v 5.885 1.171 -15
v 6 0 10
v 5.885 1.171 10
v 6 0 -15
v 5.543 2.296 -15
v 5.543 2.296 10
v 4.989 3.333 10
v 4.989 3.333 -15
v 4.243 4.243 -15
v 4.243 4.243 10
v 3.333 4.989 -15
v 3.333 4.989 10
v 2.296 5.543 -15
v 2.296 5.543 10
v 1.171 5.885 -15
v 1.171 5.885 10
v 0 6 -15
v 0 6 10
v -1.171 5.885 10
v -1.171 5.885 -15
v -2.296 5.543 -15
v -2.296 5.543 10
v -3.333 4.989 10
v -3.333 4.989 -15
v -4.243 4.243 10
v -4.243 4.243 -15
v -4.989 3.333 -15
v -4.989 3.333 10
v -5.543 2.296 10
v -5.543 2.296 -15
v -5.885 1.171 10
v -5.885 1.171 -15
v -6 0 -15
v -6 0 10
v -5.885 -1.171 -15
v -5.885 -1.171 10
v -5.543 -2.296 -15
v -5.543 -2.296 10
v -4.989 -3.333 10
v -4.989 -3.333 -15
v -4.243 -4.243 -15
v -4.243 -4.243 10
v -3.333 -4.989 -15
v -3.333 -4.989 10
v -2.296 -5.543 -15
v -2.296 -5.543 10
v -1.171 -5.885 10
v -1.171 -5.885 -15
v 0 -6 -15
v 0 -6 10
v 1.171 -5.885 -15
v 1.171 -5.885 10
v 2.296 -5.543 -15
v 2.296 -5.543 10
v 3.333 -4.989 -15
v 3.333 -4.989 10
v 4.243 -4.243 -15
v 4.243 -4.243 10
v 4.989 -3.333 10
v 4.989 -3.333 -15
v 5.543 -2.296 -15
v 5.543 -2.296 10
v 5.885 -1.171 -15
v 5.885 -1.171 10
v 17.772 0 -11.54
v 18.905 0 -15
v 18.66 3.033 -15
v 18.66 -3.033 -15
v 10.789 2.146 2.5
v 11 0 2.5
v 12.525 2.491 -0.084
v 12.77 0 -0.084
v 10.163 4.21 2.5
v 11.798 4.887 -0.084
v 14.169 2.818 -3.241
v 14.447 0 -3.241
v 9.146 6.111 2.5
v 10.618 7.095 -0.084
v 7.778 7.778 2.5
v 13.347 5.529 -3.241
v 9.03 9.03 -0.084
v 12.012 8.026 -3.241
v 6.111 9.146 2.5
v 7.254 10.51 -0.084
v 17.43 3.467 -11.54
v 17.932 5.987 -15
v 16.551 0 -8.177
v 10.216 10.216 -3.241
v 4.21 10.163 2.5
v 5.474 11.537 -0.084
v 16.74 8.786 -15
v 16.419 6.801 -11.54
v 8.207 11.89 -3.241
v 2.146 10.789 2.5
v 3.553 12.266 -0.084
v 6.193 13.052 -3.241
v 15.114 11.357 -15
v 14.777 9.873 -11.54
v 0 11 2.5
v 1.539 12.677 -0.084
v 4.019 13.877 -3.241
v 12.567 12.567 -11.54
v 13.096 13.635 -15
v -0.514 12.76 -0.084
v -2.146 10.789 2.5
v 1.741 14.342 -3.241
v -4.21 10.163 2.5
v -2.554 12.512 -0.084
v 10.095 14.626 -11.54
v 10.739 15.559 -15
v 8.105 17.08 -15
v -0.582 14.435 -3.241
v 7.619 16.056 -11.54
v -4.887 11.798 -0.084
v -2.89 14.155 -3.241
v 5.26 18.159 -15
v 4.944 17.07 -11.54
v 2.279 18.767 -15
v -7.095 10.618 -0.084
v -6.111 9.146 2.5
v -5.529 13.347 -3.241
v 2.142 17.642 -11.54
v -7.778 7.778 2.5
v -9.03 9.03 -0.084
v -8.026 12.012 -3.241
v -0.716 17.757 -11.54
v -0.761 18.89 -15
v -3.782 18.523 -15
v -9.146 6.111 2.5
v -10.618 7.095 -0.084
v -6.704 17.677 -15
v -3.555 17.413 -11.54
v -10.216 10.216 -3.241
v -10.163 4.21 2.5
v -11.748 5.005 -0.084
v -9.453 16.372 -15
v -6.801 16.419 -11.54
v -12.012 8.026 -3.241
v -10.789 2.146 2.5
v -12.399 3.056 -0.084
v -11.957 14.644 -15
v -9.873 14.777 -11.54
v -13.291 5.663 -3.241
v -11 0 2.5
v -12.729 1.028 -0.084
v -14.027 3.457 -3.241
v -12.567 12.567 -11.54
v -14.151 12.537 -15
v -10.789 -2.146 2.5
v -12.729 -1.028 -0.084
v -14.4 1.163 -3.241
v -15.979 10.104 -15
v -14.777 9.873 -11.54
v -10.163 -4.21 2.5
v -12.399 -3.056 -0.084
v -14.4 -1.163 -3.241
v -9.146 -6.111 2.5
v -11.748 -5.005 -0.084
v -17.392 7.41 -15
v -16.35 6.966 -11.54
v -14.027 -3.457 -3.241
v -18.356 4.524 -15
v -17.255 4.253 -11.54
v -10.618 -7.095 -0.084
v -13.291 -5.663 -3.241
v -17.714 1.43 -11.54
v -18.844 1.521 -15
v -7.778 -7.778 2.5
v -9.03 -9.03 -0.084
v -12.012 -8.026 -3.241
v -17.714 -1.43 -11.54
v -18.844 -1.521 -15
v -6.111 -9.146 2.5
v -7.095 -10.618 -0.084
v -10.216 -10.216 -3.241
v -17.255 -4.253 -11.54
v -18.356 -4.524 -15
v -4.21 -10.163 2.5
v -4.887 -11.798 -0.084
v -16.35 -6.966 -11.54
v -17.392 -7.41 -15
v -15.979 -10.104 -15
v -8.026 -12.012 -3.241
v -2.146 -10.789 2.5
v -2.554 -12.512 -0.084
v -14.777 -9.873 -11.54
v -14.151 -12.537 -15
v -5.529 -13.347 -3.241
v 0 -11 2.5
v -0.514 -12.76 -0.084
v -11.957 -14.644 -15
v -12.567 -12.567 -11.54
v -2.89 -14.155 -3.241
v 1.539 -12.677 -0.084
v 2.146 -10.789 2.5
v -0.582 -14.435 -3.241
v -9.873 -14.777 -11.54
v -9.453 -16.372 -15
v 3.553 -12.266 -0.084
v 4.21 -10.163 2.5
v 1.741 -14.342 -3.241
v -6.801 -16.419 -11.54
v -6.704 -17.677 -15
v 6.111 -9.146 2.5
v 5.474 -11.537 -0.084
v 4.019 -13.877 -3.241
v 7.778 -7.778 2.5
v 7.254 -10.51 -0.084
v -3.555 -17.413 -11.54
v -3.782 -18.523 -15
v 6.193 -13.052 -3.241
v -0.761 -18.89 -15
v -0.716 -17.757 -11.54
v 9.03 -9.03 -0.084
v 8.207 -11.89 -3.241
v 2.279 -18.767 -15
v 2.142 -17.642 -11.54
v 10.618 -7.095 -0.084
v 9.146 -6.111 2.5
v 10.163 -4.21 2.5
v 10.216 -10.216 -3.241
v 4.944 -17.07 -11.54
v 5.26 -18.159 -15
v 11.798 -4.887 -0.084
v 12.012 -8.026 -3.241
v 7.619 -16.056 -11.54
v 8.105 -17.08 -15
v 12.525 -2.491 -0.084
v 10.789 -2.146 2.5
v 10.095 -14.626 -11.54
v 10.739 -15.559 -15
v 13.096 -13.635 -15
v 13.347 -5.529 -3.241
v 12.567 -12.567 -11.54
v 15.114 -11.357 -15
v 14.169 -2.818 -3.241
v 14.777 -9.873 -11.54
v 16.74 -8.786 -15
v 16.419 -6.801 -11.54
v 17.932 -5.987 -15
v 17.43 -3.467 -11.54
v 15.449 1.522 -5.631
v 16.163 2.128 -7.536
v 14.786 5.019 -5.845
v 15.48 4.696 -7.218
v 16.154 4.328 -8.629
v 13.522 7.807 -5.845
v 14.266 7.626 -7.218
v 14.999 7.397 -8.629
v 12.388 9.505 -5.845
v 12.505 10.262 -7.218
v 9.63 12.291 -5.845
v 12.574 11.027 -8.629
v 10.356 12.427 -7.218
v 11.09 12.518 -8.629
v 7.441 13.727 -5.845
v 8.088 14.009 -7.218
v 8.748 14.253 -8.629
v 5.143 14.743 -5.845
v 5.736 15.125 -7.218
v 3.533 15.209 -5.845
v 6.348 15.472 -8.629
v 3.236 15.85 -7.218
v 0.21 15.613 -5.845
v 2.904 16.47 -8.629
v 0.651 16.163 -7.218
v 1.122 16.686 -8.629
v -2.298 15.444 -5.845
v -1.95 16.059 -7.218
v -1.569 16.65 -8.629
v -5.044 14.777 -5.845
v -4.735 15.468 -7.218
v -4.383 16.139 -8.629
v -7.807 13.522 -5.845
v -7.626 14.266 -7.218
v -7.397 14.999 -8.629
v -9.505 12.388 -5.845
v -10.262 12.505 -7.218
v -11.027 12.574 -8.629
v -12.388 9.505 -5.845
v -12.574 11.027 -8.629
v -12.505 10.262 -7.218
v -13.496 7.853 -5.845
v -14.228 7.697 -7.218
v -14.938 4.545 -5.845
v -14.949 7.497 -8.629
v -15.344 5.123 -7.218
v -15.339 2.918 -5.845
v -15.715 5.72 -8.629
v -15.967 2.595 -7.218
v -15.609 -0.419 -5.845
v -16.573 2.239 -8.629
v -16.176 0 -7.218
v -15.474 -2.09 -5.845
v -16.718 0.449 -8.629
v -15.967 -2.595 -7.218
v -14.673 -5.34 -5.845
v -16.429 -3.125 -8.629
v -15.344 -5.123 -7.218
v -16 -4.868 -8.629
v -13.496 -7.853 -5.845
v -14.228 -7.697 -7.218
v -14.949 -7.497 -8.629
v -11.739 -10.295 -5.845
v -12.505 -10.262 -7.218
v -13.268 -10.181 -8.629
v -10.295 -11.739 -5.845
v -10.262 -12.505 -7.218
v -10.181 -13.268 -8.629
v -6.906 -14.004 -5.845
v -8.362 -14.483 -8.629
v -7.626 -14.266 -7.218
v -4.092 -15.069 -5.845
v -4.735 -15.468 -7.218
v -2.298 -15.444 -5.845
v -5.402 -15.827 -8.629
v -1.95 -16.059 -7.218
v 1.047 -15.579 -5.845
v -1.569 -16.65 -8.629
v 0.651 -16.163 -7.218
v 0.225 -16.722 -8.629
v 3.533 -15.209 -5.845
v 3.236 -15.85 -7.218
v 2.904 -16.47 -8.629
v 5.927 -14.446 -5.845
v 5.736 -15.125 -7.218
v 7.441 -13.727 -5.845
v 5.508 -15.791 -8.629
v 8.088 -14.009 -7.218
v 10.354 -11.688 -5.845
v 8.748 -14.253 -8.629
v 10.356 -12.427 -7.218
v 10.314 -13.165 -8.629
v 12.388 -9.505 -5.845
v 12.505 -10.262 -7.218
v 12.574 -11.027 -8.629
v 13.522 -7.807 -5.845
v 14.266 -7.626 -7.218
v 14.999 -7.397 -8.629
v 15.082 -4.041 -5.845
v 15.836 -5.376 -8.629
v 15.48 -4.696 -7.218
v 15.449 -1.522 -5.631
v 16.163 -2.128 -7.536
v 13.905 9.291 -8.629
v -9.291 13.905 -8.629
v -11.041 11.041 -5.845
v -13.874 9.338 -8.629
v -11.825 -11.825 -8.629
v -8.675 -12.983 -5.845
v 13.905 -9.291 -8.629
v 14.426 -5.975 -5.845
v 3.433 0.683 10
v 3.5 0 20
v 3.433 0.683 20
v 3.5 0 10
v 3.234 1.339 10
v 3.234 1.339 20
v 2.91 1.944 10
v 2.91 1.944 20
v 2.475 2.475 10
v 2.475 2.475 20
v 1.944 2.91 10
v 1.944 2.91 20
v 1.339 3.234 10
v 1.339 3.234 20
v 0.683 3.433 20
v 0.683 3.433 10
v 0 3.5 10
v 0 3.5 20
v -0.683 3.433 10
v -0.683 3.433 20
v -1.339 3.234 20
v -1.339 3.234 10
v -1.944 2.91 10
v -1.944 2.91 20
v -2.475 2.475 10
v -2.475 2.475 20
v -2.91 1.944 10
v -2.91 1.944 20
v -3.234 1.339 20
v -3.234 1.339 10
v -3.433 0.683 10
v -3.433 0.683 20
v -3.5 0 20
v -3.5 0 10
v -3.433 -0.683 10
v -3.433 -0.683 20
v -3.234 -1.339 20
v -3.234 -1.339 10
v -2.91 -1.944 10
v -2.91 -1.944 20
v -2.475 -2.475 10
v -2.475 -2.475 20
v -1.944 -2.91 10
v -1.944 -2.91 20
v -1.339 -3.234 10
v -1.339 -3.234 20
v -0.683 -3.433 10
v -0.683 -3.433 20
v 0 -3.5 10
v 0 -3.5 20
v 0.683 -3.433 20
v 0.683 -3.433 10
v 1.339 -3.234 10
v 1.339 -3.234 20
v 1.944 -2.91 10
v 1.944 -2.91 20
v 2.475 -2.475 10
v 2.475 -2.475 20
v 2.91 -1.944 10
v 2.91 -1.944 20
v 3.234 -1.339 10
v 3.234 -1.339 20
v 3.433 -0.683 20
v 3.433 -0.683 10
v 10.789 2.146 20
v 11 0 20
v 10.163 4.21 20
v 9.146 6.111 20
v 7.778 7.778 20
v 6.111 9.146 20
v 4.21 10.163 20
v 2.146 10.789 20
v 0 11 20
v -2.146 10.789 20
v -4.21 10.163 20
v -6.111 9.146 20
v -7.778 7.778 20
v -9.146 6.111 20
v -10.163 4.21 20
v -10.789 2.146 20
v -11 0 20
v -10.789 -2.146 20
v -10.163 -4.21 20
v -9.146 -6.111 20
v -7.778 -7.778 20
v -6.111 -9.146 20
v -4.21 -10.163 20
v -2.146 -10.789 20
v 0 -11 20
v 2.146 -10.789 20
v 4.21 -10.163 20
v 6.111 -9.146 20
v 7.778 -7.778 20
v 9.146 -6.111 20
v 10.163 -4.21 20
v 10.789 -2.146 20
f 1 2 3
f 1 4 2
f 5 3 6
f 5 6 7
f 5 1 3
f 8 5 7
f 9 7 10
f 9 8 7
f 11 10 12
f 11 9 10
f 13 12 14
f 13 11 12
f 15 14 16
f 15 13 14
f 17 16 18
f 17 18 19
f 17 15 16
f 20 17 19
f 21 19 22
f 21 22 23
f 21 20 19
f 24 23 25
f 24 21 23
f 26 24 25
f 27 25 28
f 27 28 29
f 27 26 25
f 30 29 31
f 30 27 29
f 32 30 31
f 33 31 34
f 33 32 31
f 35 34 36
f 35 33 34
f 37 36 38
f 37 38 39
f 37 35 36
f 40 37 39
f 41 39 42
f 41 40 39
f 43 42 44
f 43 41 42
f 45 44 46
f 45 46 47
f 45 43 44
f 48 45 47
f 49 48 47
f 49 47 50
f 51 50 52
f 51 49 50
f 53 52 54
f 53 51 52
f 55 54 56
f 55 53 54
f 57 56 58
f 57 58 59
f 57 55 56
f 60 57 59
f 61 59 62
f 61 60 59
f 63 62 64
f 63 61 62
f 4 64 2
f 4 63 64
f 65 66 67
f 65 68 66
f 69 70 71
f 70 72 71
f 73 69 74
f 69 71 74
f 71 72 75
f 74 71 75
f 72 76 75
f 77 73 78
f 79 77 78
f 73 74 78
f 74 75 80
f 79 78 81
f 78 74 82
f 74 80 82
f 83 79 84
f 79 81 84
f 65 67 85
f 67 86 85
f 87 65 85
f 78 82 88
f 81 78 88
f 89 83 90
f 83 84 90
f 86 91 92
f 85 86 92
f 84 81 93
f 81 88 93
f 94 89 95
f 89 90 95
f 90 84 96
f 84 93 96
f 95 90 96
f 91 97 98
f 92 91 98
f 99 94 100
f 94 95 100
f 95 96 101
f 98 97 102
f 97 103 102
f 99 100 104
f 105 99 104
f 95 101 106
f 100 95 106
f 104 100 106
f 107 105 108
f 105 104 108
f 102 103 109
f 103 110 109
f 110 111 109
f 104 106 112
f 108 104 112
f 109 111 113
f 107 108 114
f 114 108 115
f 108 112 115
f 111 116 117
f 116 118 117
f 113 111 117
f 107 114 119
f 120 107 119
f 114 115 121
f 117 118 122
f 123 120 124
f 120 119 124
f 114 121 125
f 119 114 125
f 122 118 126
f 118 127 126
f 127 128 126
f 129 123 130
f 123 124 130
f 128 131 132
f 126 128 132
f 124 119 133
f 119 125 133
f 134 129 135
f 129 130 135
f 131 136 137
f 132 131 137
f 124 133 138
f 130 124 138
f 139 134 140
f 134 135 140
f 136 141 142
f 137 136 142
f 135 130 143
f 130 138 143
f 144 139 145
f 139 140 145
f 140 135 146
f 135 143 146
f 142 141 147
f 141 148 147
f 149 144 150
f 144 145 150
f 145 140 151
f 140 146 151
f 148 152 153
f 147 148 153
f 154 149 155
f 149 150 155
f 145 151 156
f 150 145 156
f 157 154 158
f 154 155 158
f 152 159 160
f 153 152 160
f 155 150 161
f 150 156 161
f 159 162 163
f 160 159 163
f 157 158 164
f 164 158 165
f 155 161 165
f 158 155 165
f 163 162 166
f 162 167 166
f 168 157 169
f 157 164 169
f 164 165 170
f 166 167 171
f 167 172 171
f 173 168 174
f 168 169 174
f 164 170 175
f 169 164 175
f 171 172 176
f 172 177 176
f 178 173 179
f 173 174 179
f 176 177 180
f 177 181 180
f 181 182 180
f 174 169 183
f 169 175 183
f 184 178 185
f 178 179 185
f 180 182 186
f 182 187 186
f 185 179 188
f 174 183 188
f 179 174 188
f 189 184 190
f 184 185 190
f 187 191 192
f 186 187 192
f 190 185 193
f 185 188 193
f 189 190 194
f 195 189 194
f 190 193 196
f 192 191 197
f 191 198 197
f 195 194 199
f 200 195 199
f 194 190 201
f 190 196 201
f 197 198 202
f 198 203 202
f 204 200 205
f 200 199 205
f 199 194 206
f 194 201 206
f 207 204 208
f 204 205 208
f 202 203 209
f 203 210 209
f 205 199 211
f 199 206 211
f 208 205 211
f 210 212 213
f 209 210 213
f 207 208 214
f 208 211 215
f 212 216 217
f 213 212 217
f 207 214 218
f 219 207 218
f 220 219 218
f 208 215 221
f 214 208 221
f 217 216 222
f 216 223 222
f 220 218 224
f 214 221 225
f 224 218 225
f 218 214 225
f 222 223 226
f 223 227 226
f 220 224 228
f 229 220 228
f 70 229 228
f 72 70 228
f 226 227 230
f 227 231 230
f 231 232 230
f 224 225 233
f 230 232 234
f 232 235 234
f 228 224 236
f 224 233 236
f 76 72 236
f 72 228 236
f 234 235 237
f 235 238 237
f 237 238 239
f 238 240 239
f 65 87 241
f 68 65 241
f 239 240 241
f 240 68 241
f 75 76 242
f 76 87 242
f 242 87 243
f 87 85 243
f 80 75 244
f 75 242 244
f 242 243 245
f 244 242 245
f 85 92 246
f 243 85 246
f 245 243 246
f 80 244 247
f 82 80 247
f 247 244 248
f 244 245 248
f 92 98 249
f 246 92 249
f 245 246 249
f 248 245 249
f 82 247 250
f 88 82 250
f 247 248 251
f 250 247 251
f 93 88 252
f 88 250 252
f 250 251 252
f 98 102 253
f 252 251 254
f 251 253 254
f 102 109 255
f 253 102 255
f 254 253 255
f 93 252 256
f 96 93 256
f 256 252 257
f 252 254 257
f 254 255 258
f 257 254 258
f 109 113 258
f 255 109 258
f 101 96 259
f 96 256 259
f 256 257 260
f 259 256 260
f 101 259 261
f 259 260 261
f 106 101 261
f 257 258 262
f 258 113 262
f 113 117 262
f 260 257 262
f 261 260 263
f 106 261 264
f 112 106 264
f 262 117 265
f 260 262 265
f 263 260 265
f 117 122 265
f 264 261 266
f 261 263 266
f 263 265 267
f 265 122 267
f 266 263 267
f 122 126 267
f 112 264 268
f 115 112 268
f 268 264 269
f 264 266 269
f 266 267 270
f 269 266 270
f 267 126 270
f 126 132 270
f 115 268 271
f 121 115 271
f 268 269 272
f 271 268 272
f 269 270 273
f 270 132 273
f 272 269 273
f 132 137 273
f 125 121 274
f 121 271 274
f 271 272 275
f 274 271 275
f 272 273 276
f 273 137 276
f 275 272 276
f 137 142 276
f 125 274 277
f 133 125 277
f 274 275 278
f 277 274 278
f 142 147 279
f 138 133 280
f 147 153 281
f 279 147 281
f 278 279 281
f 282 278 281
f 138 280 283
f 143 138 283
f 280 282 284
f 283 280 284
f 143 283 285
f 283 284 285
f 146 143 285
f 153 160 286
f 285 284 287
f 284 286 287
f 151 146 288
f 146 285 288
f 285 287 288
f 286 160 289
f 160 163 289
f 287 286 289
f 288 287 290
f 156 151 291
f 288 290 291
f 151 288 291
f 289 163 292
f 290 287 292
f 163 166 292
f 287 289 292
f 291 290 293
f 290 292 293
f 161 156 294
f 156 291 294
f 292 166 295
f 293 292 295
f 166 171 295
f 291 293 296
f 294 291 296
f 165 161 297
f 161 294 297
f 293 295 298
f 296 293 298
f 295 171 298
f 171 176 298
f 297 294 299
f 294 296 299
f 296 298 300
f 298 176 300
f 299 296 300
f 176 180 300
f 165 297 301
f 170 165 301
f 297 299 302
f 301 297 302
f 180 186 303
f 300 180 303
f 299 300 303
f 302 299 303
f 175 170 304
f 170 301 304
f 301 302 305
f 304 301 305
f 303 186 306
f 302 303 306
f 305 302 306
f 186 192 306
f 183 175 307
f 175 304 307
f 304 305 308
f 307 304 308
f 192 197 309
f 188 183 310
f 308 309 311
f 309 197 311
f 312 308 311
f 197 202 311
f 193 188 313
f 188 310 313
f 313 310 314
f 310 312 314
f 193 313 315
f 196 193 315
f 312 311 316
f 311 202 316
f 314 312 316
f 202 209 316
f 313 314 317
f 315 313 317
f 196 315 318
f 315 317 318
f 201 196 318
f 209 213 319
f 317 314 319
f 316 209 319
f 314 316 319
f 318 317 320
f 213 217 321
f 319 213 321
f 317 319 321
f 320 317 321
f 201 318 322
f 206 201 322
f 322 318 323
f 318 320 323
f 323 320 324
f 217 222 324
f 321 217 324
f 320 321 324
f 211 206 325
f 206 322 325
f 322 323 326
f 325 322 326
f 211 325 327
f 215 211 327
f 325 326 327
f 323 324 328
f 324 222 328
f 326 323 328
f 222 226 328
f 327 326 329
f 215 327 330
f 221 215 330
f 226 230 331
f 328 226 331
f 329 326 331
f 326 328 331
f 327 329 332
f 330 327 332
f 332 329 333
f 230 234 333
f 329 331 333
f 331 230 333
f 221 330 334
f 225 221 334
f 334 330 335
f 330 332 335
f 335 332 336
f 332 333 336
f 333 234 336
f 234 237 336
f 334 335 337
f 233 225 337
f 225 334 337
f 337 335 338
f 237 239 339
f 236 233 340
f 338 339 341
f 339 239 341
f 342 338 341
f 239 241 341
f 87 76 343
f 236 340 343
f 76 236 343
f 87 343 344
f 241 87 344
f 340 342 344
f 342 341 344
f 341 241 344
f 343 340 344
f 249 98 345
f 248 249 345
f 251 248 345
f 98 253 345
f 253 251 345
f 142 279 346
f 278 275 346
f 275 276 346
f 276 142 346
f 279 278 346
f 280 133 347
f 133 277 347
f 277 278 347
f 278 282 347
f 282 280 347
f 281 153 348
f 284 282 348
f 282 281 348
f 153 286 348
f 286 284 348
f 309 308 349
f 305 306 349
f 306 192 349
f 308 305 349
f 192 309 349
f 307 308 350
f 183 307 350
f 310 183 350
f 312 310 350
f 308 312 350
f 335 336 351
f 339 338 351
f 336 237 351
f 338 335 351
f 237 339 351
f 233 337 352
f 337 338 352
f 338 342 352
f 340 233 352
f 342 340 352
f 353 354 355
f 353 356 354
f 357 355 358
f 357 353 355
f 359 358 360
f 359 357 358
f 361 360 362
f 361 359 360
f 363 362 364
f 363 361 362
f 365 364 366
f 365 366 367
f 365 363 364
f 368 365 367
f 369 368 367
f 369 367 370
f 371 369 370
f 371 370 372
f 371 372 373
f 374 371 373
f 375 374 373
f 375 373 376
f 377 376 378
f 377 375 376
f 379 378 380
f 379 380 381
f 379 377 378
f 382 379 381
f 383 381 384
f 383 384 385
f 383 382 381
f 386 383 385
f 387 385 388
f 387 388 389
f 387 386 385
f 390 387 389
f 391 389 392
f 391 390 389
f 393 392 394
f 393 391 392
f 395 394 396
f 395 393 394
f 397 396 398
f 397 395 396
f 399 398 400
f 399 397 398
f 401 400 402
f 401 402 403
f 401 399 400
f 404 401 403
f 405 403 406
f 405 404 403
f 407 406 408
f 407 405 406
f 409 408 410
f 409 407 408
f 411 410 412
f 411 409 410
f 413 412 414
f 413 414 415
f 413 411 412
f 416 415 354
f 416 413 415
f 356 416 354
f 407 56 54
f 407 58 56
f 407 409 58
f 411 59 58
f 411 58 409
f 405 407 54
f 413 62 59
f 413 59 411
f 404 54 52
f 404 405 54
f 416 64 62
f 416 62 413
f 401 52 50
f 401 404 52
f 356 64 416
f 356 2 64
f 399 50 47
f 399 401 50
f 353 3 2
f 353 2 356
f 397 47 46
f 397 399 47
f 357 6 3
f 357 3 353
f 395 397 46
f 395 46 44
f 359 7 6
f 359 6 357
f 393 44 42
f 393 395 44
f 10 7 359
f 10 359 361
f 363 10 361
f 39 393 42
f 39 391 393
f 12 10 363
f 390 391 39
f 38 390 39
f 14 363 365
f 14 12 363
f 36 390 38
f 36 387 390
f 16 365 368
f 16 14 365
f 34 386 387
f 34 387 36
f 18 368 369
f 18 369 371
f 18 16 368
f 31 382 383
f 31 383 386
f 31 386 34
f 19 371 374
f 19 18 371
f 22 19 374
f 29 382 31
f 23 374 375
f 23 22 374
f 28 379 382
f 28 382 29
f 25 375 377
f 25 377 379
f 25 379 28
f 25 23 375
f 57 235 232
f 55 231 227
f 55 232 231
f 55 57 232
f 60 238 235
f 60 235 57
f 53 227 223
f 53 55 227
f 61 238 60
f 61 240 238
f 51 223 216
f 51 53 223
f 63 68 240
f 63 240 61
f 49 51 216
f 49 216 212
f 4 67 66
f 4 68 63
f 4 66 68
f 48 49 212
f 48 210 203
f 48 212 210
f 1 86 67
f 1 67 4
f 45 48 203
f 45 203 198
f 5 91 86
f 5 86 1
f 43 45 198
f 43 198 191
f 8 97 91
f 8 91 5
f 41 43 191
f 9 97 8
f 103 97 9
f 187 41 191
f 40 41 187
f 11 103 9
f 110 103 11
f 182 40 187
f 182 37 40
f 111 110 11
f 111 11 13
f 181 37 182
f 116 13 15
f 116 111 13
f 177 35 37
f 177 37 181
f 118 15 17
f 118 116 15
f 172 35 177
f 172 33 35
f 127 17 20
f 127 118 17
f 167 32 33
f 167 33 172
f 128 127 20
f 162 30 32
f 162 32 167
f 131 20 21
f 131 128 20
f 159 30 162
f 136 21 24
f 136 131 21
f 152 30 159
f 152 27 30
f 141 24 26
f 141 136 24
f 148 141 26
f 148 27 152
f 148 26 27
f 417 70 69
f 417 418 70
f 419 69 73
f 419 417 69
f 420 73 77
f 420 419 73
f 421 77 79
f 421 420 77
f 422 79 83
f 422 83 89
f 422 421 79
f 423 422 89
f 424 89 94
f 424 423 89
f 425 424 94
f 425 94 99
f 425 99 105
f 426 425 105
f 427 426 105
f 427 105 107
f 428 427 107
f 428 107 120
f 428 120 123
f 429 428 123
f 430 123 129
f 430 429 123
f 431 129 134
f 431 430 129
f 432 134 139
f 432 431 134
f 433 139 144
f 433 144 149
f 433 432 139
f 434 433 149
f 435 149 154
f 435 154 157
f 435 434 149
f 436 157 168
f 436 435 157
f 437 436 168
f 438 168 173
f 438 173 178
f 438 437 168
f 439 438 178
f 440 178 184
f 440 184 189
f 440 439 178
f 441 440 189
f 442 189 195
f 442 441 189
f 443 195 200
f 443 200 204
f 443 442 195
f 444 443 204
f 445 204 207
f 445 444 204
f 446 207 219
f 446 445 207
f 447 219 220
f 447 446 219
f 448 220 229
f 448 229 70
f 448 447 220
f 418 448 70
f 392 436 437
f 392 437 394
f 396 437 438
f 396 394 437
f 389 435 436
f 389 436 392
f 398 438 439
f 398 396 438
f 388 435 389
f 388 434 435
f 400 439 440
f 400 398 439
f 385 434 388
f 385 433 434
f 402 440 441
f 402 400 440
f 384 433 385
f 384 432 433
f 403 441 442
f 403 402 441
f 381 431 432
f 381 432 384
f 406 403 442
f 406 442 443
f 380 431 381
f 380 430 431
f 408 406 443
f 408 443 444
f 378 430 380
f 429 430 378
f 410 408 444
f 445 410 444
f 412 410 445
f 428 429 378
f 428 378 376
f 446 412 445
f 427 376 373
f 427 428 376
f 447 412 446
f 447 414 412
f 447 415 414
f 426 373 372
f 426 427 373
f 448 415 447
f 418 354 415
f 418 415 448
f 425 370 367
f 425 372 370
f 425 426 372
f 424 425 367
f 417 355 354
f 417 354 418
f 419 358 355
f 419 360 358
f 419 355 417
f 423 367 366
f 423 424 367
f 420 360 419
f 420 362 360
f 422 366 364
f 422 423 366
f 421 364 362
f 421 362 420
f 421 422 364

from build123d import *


with BuildPart() as f1:
    # F0 (on Front) → F1 (revolve)
    with BuildSketch(Plane.XZ):
        with BuildLine():
            add(Edge.make_bspline(
                [(11, 2.5), (14.0556900188, -1.2942891031), (16.7506798401, -8.110861107), (18.9052545744, -15)],
                knots=[0, 0, 0, 0, 0.3619010088, 0.3619010088, 0.3619010088, 0.3619010088], degree=3))
            Line((11, 2.5), (11, -15))
            Line((11, -15), (18.9052545744, -15))
        make_face()
        Polygon((11, 20), (3.5, 20), (3.5, 10), (6, 10), (6, -15), (11, -15), (11, 2.5), align=None)
    revolve(axis=Axis((0, 0, 3.6827032454), (0, 0, 1)))


solid = f1.part
